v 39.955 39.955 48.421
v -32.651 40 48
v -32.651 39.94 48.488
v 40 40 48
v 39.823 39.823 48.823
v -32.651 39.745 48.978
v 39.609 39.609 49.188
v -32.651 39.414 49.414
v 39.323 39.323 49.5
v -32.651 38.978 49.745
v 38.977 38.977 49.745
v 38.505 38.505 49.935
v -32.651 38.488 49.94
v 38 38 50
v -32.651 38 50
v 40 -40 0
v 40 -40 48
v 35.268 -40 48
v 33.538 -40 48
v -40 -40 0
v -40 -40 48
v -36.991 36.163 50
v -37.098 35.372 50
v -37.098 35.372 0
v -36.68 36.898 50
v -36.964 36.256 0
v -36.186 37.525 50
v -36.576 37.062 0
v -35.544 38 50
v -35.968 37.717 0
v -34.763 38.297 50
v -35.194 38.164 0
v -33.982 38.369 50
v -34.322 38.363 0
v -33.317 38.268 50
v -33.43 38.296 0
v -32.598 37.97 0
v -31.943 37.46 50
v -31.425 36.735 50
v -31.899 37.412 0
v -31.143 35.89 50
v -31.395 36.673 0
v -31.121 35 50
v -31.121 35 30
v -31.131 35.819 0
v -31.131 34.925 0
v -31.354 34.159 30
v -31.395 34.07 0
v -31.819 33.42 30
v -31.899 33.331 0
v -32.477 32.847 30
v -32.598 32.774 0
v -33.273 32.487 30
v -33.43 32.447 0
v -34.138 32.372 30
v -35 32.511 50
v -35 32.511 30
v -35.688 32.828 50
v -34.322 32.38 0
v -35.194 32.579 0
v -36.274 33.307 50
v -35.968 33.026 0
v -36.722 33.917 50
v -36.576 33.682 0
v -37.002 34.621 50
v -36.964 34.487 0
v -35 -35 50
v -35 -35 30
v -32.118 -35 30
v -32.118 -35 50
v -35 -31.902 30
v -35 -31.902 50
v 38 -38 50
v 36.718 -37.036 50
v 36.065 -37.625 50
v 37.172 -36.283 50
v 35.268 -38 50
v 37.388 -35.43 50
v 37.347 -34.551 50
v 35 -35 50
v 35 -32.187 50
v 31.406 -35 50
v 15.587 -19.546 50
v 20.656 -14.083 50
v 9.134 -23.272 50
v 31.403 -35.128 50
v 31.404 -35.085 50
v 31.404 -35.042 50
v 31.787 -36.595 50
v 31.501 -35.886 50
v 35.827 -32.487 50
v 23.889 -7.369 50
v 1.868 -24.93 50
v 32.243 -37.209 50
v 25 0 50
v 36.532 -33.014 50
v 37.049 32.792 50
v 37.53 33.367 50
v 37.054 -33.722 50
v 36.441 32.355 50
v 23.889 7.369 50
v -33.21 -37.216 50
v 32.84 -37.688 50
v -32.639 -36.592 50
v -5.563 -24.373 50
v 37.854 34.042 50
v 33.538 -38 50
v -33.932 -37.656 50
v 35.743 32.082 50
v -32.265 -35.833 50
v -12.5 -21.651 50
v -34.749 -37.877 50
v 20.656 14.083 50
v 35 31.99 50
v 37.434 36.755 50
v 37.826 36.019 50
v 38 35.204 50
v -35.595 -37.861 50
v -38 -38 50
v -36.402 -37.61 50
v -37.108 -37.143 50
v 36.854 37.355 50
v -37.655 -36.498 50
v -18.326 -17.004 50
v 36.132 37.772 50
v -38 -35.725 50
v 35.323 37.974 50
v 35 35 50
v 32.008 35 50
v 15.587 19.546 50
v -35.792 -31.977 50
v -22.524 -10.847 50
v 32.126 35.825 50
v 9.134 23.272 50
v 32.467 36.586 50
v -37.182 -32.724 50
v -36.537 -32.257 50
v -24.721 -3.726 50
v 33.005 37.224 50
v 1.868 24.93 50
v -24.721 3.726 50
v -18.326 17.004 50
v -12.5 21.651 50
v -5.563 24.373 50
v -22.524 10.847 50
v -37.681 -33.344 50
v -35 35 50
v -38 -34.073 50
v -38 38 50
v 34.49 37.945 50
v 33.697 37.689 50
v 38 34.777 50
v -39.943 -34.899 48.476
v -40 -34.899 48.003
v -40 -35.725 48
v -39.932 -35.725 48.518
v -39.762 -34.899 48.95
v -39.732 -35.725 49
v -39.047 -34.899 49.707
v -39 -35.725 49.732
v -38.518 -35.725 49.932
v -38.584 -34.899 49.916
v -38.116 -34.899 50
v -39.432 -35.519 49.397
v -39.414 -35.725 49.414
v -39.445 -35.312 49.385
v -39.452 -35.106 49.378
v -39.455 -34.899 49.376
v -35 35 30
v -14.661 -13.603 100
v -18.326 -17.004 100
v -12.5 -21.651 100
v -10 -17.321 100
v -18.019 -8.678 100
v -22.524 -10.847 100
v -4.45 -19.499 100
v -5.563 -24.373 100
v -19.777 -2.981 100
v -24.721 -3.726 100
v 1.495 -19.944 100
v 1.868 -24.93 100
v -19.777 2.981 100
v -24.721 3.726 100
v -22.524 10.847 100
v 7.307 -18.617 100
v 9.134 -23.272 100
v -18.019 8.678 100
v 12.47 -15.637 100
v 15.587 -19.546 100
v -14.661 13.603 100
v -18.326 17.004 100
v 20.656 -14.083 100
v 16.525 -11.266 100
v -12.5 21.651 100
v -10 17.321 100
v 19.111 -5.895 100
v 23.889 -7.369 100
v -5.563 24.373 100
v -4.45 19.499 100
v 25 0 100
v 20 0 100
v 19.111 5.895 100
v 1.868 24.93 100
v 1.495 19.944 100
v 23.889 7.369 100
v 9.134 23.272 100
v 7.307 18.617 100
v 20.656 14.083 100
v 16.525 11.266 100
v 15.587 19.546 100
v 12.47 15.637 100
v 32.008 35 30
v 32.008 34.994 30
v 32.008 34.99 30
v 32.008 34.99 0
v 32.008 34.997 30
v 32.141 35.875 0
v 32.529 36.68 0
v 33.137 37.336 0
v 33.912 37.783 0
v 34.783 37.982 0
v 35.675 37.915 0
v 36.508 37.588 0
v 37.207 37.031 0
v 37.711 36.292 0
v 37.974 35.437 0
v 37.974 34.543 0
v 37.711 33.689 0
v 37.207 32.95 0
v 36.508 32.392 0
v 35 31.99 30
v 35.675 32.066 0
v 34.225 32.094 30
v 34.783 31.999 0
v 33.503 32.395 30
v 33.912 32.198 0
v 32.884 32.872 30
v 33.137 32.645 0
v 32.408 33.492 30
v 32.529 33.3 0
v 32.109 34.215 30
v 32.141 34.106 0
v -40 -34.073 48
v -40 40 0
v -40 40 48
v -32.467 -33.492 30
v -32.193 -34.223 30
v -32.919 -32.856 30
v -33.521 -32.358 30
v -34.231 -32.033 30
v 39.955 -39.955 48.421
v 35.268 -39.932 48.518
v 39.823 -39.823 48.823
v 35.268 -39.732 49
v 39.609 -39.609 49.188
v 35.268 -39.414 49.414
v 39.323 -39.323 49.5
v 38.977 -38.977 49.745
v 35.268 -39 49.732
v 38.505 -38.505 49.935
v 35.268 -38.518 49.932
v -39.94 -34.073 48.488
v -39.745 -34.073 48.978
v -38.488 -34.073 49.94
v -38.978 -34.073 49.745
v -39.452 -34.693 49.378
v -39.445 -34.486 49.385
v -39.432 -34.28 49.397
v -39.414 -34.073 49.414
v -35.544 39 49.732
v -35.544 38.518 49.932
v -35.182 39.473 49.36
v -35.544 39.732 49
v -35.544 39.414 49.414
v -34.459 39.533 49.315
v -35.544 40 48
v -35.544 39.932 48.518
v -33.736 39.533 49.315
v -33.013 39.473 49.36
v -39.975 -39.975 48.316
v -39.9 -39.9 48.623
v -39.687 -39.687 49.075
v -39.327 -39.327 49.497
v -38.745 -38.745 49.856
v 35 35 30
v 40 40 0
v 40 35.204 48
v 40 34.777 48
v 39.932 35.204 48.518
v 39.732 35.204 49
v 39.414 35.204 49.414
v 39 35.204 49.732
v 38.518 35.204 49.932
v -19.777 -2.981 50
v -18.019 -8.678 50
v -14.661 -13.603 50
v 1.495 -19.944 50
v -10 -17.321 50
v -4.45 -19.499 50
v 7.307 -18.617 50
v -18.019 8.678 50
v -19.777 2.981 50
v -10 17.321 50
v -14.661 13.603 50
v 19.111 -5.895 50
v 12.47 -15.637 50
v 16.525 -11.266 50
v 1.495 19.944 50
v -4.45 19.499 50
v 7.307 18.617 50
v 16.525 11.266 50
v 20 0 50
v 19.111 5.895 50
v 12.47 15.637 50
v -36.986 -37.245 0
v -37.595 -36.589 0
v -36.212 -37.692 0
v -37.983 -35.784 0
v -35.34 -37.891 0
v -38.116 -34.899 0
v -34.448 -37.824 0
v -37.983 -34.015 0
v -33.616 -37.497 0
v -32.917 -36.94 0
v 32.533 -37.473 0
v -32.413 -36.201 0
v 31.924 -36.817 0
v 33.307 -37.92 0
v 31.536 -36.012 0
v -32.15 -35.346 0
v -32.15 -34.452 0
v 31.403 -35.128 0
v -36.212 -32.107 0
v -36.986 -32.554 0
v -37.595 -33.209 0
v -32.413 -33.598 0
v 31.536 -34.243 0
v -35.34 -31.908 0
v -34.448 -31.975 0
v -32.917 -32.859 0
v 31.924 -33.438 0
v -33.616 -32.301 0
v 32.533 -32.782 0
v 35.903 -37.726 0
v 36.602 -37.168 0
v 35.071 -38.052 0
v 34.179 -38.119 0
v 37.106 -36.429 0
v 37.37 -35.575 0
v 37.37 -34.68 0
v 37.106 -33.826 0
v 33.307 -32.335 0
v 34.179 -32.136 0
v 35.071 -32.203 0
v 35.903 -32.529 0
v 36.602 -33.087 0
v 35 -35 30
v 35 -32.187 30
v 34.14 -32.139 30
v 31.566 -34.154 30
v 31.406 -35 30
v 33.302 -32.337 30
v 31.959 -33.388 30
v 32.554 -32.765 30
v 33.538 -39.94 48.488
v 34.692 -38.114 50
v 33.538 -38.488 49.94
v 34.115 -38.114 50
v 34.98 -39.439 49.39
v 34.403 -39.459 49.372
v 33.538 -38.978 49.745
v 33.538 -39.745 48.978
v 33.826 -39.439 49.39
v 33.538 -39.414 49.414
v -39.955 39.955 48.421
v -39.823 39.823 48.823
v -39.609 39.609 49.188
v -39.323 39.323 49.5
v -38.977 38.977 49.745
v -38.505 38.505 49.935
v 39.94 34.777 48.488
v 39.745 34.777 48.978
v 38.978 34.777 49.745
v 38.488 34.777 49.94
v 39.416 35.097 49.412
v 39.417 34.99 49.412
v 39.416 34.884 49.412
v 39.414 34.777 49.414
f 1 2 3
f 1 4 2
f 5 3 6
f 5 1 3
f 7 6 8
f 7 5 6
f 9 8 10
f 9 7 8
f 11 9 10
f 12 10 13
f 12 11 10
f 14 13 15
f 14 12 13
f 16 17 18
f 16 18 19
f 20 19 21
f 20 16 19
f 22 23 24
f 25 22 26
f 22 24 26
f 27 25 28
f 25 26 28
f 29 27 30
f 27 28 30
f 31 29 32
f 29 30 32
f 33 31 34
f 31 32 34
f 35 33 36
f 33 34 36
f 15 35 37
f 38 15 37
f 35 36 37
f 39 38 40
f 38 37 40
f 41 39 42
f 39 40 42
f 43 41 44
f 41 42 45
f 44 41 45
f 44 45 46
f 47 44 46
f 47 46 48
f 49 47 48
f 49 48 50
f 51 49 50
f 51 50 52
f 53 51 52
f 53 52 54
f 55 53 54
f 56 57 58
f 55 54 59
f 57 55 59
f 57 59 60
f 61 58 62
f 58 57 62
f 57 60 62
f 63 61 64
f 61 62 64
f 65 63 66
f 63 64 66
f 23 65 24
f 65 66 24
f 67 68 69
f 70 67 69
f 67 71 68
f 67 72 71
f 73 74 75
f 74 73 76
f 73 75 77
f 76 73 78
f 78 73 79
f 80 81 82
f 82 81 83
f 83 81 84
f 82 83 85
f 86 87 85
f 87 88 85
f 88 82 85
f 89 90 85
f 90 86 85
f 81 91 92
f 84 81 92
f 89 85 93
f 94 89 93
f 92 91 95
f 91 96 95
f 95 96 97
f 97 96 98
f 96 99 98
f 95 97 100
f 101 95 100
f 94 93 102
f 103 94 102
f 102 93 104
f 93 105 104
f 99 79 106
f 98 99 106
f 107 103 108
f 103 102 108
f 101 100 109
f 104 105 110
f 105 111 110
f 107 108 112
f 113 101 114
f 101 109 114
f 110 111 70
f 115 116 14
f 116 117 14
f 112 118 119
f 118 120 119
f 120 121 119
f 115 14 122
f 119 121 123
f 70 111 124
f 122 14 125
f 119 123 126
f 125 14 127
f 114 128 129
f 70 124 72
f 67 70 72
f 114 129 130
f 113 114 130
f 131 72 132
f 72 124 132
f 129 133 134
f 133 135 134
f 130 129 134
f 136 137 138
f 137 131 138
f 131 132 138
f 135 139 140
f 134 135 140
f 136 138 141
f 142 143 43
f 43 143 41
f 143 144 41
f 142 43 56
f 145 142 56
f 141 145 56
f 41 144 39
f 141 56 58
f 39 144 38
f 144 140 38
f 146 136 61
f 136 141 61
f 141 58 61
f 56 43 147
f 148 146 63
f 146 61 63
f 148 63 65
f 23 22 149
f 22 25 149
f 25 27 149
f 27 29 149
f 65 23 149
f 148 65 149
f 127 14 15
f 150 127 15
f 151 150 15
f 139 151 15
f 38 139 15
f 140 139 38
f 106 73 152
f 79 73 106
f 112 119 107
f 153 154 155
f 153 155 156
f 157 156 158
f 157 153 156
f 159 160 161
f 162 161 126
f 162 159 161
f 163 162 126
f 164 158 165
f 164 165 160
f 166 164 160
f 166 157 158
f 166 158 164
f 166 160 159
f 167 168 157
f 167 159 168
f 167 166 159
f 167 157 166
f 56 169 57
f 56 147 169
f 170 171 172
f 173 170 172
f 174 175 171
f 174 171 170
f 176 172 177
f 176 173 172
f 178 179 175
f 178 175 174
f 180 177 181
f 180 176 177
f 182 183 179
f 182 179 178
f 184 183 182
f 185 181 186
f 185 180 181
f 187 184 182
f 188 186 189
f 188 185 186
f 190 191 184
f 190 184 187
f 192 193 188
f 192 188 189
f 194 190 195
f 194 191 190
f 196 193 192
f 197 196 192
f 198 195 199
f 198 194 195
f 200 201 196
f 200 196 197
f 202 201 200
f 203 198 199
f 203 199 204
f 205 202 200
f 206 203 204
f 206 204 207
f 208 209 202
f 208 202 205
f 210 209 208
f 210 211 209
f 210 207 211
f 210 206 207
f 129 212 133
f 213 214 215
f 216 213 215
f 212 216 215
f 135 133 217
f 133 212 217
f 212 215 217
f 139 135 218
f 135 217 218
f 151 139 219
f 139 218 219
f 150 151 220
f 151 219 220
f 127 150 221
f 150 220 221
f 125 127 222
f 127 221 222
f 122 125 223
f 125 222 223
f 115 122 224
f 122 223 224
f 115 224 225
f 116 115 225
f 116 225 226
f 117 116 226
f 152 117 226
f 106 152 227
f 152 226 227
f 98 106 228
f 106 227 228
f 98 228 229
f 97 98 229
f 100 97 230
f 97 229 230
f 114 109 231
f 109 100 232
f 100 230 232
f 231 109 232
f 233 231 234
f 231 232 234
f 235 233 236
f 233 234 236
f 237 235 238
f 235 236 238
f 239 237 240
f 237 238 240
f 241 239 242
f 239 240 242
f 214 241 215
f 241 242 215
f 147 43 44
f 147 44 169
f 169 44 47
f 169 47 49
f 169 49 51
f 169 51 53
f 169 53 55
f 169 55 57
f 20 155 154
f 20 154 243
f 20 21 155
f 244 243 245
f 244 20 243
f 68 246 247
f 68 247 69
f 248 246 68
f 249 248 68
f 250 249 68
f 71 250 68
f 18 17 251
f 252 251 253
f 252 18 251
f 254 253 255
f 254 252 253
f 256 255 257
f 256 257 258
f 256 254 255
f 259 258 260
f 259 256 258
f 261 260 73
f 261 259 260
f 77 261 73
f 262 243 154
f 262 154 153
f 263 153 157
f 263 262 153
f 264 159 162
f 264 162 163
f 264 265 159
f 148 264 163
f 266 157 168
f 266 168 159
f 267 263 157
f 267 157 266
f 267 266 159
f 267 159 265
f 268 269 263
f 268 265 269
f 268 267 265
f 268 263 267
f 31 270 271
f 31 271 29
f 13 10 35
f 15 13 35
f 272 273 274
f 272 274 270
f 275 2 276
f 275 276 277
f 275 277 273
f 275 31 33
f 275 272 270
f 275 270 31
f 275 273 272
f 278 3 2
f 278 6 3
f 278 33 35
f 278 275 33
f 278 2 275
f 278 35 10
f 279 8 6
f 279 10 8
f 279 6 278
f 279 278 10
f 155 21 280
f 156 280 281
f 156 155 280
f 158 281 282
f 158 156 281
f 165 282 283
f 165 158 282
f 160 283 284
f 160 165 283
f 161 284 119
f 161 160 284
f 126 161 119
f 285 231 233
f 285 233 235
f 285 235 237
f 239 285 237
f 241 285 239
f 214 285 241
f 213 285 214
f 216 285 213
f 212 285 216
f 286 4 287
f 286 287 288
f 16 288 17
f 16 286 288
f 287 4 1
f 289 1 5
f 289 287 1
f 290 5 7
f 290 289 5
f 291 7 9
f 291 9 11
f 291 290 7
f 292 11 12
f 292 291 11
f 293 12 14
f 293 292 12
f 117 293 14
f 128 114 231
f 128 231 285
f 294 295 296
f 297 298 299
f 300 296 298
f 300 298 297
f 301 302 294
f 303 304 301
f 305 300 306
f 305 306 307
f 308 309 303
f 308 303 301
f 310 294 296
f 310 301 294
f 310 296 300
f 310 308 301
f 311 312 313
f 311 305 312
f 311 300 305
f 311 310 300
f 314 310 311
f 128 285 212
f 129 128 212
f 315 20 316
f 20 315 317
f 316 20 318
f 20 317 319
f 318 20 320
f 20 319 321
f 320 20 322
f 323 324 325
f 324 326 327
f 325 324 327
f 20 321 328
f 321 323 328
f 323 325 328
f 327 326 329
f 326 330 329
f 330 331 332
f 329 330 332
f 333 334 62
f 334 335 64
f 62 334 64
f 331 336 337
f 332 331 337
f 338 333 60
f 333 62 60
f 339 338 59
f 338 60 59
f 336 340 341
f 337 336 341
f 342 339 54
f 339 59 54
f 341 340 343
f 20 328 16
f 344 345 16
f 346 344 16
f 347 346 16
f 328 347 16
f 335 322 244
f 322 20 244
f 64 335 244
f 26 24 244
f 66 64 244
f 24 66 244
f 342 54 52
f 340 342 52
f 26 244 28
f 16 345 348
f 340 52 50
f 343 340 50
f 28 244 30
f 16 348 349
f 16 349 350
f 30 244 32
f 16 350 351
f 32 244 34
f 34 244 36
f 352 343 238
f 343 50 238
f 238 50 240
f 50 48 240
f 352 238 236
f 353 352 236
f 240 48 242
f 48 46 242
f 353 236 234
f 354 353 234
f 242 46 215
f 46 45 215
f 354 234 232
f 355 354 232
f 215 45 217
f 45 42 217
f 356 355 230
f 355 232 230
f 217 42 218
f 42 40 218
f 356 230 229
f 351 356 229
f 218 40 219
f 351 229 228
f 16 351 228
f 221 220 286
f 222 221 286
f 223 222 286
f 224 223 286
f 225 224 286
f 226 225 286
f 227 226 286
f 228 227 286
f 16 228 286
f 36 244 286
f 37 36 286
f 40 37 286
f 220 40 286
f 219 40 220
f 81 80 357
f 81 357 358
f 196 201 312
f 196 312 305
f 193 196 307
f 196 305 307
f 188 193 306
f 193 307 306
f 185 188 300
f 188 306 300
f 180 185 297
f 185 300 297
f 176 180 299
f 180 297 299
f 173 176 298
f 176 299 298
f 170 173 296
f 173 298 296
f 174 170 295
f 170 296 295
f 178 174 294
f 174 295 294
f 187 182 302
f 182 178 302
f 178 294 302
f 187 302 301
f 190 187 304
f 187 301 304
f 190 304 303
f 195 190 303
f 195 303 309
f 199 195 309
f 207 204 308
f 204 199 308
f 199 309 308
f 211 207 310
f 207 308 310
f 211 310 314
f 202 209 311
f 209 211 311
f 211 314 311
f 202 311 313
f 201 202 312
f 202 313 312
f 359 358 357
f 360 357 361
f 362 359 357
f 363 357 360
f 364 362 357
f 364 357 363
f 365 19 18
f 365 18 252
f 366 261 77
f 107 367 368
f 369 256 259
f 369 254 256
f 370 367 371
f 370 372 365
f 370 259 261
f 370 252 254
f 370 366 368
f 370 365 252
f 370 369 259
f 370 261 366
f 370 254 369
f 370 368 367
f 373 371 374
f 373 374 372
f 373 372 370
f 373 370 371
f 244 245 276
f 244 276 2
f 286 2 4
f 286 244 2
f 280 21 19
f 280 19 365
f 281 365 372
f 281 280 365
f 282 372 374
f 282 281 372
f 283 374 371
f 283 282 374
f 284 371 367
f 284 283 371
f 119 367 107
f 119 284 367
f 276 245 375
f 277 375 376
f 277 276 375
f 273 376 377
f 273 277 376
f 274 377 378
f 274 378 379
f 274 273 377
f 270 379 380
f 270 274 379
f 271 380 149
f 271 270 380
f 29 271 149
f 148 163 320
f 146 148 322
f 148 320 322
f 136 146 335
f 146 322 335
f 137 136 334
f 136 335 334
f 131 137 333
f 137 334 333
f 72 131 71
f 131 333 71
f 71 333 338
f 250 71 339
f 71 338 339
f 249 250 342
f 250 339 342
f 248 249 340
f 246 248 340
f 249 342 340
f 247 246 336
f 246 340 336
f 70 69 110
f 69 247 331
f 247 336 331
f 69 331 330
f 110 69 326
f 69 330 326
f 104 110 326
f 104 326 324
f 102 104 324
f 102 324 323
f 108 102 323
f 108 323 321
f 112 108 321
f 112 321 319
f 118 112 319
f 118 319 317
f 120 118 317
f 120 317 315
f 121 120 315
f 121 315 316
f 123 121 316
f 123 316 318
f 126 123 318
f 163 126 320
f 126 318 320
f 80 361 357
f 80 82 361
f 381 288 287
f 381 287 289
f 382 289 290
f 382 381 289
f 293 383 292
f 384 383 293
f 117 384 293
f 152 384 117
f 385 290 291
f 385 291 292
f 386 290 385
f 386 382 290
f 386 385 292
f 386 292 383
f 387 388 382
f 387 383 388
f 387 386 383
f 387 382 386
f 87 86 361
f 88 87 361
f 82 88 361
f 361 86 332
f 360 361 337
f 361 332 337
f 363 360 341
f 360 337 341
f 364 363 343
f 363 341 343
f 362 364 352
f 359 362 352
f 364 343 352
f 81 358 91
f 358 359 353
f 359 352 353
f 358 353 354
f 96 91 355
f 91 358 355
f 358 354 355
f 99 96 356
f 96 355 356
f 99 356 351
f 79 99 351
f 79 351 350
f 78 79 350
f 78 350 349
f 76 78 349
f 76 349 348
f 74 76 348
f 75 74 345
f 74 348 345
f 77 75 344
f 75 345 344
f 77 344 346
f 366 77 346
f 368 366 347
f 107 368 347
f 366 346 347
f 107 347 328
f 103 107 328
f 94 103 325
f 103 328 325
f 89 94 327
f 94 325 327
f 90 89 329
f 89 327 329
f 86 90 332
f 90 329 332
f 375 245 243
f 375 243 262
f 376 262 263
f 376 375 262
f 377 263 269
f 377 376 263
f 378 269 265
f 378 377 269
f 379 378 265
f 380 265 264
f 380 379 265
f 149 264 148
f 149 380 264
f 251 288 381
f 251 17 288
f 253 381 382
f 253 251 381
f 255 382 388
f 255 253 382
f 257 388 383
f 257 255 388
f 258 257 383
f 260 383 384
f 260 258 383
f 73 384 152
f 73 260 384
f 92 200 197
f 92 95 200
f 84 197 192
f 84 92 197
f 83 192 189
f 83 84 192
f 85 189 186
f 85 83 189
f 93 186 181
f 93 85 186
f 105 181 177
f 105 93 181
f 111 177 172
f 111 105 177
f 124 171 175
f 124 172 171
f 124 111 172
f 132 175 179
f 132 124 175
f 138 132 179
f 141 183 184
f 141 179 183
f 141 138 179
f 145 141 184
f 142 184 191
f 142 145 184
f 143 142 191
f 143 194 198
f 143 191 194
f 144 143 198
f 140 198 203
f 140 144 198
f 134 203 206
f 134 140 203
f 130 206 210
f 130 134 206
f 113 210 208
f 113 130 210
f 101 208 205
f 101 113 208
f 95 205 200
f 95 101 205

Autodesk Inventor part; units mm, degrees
ref_plane "YZ Plane" through (0, 0, 0) normal (1, 0, 0) x (0, 1, 0)
ref_plane "XZ Plane" through (0, 0, 0) normal (0, 1, 0) x (-1, 0, 0)
ref_plane "XY Plane" through (0, 0, 0) normal (0, 0, 1) x (1, 0, 0)
sketch "Sketch1" plane through (0, 0, 0) normal (0, 0, 1) x (1, 0, 0)
  line L0 (-40, 40) -> (40, 40)
  line L1 (40, 40) -> (40, -40)
  line L2 (40, -40) -> (-40, -40)
  line L3 (-40, -40) -> (-40, 40)
  line L4 (-40, 40) -> (40, -40) construction
  line L5 (40, 40) -> (-40, -40) construction
  point P0 (0, 0)
  dimension "d0" = 80
  dimension "d1" = 80
extrude "Extrusion1" add sketch "Sketch1" along normal blind 50
sketch "Sketch2" plane through (0, 0, 50) normal (0, 0, 1) x (1, 0, 0)
  circle A0 centre (0, 0) radius 25
  circle A1 centre (0, 0) radius 20
  dimension "d4" = 50
  dimension "d5" = 5
extrude "Extrusion2" add sketch "Sketch2" along normal blind 50
sketch "Sketch3" plane through (0, 0, 0) normal (0, 0, -1) x (-1, 0, 0)
  line L0 (-35, 35) -> (35, 35)
  line L1 (35, 35) -> (35, -35)
  line L2 (35, -35) -> (-35, -35)
  line L3 (-35, -35) -> (-35, 35)
  line L4 (-35, 35) -> (35, -35) construction
  line L5 (35, 35) -> (-35, -35) construction
  point P0 (0, 0)
  dimension "d8" = 70
  dimension "d9" = 70
sketch "Sketch4" plane through (0, 0, 0) normal (0, 0, -1) x (-1, 0, 0)
  line L0 (-40, 40) -> (40, 40) projected
  circle A0 centre (-35.0076, 34.9903) radius 3
  circle A1 centre (-34.4032, -35.1275) radius 3
  circle A2 centre (35.116, -34.8993) radius 3
  circle A3 centre (34.0977, 35.3717) radius 3
  point P0 (0, 0)
  dimension "d10" = 6
  dimension "d11" = 6
  dimension "d12" = 6
  dimension "d13" = 6
extrude "Extrusion3" cut sketch "Sketch4" against normal blind 50
fillet "Fillet1" radius 2 4 edges at (0, 40, 50) (40, 0, 50) (0, -40, 50) (-40, 0, 50)
thread "Thread1" size "M6x1" class "6H" standard "ANSI Metric M Profile" full length
thread "Thread2" size "M6x1" class "6H" standard "ANSI Metric M Profile" full length
thread "Thread3" size "M6x1" class "6H" standard "ANSI Metric M Profile" full length
thread "Thread4" size "M6x1" class "6H" standard "ANSI Metric M Profile" full length
thread "Thread5" size "M40x3" class "6H" standard "ANSI Metric M Profile" full length
extrude "Extrusion4" add sketch "Sketch3" along normal blind 20 from surface at -50
sketch "Sketch5" plane through (0, 0, 50) normal (0, 0, 1) x (1, 0, 0)
  point P0 (0, 0)
